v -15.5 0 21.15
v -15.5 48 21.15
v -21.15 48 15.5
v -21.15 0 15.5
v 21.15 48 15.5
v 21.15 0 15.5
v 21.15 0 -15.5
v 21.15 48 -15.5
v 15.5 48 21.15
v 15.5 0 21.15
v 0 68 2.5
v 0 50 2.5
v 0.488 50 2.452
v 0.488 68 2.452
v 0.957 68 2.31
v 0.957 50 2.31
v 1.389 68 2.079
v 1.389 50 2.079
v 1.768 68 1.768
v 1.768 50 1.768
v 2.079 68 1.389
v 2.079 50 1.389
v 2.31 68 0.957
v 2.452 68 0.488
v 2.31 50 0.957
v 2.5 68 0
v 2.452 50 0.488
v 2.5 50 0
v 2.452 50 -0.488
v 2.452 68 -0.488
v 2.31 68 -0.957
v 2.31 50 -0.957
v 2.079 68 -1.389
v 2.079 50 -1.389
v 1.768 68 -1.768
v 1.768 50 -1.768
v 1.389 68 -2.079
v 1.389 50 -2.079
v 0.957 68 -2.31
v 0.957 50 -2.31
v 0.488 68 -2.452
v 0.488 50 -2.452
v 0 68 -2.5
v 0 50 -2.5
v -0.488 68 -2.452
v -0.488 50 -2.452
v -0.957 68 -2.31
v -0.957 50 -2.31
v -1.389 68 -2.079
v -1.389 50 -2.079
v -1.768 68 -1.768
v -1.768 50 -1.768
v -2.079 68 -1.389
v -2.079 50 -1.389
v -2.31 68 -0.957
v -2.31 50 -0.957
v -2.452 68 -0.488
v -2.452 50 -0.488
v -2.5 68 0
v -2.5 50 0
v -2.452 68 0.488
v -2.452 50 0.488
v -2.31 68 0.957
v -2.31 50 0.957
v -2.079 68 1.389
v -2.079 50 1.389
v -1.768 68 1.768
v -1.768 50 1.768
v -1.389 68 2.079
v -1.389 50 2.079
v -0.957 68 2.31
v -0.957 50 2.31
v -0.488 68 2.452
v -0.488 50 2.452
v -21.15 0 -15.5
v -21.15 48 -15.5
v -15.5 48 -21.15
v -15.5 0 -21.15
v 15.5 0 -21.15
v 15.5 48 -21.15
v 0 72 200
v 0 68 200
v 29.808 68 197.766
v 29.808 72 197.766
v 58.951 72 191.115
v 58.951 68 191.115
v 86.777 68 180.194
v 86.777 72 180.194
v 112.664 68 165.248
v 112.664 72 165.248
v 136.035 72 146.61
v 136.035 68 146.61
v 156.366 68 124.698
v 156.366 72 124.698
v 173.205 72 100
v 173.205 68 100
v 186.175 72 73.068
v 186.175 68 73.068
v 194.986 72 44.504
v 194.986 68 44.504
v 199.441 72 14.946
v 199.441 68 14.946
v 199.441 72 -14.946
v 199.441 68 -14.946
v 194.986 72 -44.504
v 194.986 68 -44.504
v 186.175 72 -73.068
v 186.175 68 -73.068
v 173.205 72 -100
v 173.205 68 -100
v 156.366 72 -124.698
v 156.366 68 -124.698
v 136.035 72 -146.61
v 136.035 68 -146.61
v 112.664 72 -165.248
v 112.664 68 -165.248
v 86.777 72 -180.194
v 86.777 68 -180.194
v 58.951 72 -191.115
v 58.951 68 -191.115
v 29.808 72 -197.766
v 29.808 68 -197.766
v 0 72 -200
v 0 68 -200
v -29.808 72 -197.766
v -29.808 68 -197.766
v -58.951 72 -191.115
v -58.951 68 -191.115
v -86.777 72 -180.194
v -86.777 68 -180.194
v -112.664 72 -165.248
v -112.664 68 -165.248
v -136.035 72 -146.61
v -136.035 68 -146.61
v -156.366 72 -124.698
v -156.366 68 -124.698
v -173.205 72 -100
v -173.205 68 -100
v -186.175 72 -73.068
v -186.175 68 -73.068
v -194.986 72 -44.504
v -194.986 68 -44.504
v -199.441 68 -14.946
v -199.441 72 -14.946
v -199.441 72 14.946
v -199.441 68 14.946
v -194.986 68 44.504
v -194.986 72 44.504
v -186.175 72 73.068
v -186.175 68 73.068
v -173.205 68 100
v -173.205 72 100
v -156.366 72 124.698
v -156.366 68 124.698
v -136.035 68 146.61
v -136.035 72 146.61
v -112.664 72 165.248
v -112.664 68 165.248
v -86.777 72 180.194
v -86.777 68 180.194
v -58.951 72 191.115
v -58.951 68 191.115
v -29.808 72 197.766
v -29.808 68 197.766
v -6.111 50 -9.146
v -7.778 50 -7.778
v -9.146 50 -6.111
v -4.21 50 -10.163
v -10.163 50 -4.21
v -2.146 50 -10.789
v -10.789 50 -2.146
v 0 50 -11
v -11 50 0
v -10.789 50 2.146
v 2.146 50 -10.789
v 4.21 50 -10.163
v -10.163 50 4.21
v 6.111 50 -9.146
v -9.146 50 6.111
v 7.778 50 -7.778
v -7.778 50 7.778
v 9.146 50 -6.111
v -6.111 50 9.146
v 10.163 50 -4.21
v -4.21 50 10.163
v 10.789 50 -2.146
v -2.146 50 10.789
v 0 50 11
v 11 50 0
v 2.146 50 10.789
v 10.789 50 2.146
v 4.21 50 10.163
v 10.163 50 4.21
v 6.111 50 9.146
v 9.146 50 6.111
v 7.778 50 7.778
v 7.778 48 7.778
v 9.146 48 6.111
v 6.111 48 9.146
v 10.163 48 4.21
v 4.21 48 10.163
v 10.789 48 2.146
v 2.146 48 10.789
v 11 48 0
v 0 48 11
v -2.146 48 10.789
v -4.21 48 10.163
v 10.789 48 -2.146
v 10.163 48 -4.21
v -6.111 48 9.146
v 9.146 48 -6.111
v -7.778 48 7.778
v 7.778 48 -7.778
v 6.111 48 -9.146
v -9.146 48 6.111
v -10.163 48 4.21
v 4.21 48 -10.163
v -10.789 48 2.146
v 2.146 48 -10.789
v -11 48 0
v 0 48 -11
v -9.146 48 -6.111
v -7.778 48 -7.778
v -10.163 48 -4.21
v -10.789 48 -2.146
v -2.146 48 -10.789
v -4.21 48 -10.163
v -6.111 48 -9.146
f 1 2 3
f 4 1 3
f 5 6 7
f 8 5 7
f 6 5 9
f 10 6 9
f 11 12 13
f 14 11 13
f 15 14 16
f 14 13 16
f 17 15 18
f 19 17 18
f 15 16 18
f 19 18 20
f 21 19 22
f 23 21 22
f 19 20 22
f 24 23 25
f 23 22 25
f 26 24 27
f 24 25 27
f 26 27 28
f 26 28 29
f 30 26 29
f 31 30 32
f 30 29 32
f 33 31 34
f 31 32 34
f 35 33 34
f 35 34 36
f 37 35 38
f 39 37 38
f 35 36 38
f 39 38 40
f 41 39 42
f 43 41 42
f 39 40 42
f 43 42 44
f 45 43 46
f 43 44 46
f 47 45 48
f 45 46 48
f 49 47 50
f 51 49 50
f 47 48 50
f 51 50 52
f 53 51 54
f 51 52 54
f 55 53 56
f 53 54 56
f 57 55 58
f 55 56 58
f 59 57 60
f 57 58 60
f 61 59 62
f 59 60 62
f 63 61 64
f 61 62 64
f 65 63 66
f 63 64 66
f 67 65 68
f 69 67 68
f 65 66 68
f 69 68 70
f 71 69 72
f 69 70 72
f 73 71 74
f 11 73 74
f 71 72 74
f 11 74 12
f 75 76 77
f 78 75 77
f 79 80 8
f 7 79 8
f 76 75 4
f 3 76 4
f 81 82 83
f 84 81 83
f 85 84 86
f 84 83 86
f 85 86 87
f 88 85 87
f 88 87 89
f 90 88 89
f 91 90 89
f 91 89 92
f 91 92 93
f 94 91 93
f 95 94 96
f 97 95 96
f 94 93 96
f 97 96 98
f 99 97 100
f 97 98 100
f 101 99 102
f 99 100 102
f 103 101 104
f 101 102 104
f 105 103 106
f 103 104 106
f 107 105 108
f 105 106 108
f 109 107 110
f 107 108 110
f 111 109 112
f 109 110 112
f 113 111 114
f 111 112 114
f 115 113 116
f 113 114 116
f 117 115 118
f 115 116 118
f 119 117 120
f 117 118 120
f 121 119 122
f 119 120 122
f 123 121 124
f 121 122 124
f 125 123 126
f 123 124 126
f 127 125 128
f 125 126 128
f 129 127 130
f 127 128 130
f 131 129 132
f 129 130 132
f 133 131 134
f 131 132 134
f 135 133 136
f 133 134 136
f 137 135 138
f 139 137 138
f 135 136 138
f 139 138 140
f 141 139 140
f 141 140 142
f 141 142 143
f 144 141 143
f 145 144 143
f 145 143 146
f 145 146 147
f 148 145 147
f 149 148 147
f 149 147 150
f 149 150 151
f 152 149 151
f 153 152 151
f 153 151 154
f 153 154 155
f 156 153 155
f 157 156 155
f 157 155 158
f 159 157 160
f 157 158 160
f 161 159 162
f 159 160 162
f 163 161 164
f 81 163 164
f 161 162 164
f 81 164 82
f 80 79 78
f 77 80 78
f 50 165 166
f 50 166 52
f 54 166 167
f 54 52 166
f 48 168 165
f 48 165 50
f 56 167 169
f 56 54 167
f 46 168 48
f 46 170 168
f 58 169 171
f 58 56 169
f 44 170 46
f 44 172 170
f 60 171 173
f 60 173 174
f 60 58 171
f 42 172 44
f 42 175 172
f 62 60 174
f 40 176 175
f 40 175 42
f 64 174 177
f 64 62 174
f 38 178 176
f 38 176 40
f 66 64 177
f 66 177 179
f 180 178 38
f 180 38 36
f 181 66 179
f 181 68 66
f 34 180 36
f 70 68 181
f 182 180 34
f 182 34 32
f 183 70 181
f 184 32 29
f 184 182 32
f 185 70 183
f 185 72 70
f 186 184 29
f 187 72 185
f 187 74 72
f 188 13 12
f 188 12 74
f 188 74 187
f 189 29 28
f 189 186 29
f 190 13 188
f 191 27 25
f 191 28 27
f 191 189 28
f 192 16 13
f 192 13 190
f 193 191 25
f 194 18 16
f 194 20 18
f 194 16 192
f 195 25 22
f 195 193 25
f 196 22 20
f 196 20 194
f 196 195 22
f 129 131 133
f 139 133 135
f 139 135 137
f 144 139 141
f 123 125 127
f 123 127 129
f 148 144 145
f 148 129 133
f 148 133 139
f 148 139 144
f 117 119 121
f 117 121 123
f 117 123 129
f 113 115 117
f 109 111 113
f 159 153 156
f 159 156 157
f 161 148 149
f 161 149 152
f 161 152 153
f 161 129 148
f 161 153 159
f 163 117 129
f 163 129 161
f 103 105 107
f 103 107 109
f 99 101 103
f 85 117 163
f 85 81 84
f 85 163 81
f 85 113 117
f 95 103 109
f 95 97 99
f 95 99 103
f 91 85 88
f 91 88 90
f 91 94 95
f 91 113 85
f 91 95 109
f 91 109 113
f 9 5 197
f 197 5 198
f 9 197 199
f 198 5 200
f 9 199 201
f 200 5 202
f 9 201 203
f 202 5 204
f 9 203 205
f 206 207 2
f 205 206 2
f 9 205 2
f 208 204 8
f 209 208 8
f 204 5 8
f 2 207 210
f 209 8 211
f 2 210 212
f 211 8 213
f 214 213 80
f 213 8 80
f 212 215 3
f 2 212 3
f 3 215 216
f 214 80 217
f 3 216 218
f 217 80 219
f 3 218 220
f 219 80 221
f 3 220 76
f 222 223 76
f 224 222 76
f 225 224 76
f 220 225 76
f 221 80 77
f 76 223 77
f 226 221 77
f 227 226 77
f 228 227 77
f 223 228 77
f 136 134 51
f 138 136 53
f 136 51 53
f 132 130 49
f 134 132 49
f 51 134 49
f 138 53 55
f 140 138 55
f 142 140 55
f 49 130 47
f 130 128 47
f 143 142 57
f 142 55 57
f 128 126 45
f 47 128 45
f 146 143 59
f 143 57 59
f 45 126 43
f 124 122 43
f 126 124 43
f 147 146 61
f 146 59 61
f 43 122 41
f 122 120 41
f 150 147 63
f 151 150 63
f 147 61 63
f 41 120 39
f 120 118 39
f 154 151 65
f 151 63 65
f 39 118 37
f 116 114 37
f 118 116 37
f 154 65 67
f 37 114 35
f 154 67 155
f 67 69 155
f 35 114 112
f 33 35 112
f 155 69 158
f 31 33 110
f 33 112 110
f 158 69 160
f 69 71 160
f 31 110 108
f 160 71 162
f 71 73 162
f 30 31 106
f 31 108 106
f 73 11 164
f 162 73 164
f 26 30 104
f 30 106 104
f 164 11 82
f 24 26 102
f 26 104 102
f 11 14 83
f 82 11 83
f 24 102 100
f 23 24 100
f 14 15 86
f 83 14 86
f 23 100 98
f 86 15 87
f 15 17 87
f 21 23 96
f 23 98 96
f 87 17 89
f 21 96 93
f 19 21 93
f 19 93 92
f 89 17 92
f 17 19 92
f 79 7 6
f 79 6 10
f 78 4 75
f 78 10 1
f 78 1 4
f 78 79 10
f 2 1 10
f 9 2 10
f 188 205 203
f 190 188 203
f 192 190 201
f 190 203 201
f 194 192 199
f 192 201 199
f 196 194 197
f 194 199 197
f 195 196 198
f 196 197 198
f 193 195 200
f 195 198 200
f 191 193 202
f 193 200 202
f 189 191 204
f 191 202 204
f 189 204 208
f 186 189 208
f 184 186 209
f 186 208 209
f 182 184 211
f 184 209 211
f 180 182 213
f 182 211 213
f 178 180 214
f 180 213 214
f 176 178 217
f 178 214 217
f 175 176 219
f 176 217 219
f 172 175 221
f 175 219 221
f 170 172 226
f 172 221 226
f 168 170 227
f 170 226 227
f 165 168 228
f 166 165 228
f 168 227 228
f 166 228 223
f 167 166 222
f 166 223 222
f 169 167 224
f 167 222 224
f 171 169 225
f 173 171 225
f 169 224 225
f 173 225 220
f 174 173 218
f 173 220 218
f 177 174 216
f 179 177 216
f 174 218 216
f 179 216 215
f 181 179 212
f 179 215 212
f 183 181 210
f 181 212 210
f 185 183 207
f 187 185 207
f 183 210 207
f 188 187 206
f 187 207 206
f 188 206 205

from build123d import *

# Parameters (mm, degrees)
EXTRUDE_2_DEPTH = 48
SKETCH_4_R      = 11
EXTRUDE_3_DEPTH = 2
SKETCH_5_R      = 2.5
EXTRUDE_4_DEPTH = 18
SKETCH_6_R      = 200
EXTRUDE_5_DEPTH = 4


with BuildPart() as part:
    # 草圖3 → 填料-伸長2 (new body)
    with BuildSketch(Plane(origin=(0, 0, 0), x_dir=(1, 0, 0), z_dir=(0, 1, 0))):
        Polygon((-21.15, 0), (-21.15, 15.5), (-15.5, 21.15), (0, 21.15), (15.5, 21.15), (21.15, 15.5), (21.15, 0), (21.15, -15.5), (15.5, -21.15), (0, -21.15), (-15.5, -21.15), (-21.15, -15.5), align=None)
    extrude(amount=EXTRUDE_2_DEPTH)

    # 草圖4 → 填料-伸長3 (add)
    with BuildSketch(Plane(origin=(0, 48, 0), x_dir=(1, 0, 0), z_dir=(0, 1, 0))):
        with Locations(Location((0, 0, 0), (0, 0, 270))):
            Circle(SKETCH_4_R)
    extrude(amount=EXTRUDE_3_DEPTH)

    # 草圖5 → 填料-伸長4 (add)
    with BuildSketch(Plane(origin=(0, 50, 0), x_dir=(1, 0, 0), z_dir=(0, 1, 0))):
        with Locations(Location((0, 0, 0), (0, 0, 270))):
            Circle(SKETCH_5_R)
    extrude(amount=EXTRUDE_4_DEPTH)

    # 草圖6 → 填料-伸長5 (add)
    with BuildSketch(Plane(origin=(0, 68, 0), x_dir=(1, 0, 0), z_dir=(0, 1, 0))):
        with Locations(Location((0, 0, 0), (0, 0, 270))):
            Circle(SKETCH_6_R)
    extrude(amount=EXTRUDE_5_DEPTH)


solid = part.part
